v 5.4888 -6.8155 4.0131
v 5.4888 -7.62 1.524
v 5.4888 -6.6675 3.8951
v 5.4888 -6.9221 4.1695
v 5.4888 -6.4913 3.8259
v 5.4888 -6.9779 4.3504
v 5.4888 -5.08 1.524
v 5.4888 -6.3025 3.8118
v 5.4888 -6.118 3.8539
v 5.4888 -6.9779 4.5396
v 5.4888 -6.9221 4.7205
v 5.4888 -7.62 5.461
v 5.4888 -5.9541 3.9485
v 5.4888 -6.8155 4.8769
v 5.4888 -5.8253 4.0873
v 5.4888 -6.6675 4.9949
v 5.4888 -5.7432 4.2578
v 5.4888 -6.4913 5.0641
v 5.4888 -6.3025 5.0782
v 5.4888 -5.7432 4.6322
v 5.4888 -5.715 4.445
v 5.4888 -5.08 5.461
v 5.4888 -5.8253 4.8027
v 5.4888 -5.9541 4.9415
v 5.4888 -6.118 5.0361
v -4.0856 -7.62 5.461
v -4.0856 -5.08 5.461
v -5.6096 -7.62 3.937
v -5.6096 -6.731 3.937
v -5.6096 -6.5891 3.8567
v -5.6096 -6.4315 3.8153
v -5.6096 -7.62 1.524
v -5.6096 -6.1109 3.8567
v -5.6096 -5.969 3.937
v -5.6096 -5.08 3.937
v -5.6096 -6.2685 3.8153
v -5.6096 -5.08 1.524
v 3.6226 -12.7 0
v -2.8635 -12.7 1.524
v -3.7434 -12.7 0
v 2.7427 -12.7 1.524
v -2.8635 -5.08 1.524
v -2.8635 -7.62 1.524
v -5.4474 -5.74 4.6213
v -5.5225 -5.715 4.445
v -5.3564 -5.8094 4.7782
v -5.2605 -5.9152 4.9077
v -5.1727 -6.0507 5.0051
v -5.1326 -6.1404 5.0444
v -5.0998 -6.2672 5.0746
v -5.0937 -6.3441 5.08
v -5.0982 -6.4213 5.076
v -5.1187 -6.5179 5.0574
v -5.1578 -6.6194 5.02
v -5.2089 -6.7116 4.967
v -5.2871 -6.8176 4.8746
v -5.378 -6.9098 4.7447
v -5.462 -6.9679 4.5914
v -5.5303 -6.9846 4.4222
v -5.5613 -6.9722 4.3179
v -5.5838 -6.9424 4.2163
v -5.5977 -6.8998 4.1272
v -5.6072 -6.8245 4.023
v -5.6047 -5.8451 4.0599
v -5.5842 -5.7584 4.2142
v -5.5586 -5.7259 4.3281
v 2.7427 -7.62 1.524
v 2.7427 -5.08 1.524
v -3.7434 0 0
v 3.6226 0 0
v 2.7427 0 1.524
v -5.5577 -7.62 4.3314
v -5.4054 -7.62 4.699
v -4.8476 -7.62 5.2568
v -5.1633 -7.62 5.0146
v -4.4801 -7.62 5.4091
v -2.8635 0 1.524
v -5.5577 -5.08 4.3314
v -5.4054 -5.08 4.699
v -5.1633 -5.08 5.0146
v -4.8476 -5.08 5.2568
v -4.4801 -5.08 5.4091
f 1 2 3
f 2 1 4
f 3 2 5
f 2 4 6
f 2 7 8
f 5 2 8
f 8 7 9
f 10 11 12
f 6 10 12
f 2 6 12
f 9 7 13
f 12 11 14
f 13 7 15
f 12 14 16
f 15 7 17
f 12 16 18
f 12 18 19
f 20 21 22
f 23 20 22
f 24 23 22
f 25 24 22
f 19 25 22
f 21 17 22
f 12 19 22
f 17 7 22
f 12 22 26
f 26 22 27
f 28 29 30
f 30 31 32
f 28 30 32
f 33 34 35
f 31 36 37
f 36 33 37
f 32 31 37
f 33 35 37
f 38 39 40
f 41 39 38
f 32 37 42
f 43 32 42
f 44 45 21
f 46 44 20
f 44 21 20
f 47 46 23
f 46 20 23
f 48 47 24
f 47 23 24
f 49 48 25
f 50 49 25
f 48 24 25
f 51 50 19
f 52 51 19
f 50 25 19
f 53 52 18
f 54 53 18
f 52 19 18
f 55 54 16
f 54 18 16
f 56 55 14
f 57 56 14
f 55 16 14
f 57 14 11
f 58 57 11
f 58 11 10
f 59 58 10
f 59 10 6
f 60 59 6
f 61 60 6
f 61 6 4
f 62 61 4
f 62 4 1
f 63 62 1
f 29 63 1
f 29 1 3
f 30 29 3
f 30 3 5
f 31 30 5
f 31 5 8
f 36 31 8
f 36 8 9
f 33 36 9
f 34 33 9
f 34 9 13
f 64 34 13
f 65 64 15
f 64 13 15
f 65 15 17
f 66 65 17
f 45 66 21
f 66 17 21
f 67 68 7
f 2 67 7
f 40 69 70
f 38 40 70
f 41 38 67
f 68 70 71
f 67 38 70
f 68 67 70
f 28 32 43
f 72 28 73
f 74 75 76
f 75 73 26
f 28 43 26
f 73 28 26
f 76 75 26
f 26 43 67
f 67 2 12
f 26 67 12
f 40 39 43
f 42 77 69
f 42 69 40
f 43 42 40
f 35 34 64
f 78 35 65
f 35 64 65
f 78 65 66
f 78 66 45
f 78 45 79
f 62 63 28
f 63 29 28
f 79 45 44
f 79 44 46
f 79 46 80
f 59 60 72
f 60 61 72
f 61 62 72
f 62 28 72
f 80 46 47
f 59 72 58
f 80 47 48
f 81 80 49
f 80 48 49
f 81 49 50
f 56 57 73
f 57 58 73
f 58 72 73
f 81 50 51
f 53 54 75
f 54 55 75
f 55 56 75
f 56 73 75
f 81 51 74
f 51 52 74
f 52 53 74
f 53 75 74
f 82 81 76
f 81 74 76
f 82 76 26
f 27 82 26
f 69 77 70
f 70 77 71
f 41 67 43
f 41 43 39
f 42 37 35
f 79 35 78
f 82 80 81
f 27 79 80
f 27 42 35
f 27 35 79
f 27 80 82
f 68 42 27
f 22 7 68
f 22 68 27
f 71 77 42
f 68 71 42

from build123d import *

# Parameters (mm, degrees)
F1_DEPTH = 12.7
F2_W     = 2.54
F2_H     = 3.937
F3_DEPTH = 25.4
F4_R     = 1.524
F5_R     = 0.635
F6_DEPTH = 25.4


with BuildPart() as f1:
    # F0 (on Front) → F1 (new body)
    with BuildSketch(Plane.XZ):
        Polygon((-2.863529, 1.524), (-3.743411, 0), (3.622589, 0), (2.742708, 1.524), (5.488804, 1.524), (5.488804, 5.461), (-5.609625, 5.461), (-5.609625, 1.524), align=None)
    extrude(amount=F1_DEPTH)

    # F2 (on face) → F3 (intersect)
    with BuildSketch(Plane.YZ.offset(5.488804)):
        with Locations((-6.35, 3.4925)):
            Rectangle(F2_W, F2_H)
        Polygon((-7.62, 1.524), (-12.7, 1.524), (-12.7, 0), (0, 0), (0, 1.524), (-5.08, 1.524), align=None)
    extrude(amount=-F3_DEPTH, mode=Mode.INTERSECT)

    # F4
    f4_edges = [f1.edges().sort_by_distance(p)[0] for p in [
        (-5.609625, -6.35, 5.461),
    ]]
    fillet(f4_edges, radius=F4_R)

    # F5 (on face) → F6 (cut)
    with BuildSketch(Plane.YZ.offset(5.488804)):
        with Locations((-6.35, 4.445)):
            Circle(F5_R)
    extrude(amount=-F6_DEPTH, mode=Mode.SUBTRACT)


solid = f1.part
